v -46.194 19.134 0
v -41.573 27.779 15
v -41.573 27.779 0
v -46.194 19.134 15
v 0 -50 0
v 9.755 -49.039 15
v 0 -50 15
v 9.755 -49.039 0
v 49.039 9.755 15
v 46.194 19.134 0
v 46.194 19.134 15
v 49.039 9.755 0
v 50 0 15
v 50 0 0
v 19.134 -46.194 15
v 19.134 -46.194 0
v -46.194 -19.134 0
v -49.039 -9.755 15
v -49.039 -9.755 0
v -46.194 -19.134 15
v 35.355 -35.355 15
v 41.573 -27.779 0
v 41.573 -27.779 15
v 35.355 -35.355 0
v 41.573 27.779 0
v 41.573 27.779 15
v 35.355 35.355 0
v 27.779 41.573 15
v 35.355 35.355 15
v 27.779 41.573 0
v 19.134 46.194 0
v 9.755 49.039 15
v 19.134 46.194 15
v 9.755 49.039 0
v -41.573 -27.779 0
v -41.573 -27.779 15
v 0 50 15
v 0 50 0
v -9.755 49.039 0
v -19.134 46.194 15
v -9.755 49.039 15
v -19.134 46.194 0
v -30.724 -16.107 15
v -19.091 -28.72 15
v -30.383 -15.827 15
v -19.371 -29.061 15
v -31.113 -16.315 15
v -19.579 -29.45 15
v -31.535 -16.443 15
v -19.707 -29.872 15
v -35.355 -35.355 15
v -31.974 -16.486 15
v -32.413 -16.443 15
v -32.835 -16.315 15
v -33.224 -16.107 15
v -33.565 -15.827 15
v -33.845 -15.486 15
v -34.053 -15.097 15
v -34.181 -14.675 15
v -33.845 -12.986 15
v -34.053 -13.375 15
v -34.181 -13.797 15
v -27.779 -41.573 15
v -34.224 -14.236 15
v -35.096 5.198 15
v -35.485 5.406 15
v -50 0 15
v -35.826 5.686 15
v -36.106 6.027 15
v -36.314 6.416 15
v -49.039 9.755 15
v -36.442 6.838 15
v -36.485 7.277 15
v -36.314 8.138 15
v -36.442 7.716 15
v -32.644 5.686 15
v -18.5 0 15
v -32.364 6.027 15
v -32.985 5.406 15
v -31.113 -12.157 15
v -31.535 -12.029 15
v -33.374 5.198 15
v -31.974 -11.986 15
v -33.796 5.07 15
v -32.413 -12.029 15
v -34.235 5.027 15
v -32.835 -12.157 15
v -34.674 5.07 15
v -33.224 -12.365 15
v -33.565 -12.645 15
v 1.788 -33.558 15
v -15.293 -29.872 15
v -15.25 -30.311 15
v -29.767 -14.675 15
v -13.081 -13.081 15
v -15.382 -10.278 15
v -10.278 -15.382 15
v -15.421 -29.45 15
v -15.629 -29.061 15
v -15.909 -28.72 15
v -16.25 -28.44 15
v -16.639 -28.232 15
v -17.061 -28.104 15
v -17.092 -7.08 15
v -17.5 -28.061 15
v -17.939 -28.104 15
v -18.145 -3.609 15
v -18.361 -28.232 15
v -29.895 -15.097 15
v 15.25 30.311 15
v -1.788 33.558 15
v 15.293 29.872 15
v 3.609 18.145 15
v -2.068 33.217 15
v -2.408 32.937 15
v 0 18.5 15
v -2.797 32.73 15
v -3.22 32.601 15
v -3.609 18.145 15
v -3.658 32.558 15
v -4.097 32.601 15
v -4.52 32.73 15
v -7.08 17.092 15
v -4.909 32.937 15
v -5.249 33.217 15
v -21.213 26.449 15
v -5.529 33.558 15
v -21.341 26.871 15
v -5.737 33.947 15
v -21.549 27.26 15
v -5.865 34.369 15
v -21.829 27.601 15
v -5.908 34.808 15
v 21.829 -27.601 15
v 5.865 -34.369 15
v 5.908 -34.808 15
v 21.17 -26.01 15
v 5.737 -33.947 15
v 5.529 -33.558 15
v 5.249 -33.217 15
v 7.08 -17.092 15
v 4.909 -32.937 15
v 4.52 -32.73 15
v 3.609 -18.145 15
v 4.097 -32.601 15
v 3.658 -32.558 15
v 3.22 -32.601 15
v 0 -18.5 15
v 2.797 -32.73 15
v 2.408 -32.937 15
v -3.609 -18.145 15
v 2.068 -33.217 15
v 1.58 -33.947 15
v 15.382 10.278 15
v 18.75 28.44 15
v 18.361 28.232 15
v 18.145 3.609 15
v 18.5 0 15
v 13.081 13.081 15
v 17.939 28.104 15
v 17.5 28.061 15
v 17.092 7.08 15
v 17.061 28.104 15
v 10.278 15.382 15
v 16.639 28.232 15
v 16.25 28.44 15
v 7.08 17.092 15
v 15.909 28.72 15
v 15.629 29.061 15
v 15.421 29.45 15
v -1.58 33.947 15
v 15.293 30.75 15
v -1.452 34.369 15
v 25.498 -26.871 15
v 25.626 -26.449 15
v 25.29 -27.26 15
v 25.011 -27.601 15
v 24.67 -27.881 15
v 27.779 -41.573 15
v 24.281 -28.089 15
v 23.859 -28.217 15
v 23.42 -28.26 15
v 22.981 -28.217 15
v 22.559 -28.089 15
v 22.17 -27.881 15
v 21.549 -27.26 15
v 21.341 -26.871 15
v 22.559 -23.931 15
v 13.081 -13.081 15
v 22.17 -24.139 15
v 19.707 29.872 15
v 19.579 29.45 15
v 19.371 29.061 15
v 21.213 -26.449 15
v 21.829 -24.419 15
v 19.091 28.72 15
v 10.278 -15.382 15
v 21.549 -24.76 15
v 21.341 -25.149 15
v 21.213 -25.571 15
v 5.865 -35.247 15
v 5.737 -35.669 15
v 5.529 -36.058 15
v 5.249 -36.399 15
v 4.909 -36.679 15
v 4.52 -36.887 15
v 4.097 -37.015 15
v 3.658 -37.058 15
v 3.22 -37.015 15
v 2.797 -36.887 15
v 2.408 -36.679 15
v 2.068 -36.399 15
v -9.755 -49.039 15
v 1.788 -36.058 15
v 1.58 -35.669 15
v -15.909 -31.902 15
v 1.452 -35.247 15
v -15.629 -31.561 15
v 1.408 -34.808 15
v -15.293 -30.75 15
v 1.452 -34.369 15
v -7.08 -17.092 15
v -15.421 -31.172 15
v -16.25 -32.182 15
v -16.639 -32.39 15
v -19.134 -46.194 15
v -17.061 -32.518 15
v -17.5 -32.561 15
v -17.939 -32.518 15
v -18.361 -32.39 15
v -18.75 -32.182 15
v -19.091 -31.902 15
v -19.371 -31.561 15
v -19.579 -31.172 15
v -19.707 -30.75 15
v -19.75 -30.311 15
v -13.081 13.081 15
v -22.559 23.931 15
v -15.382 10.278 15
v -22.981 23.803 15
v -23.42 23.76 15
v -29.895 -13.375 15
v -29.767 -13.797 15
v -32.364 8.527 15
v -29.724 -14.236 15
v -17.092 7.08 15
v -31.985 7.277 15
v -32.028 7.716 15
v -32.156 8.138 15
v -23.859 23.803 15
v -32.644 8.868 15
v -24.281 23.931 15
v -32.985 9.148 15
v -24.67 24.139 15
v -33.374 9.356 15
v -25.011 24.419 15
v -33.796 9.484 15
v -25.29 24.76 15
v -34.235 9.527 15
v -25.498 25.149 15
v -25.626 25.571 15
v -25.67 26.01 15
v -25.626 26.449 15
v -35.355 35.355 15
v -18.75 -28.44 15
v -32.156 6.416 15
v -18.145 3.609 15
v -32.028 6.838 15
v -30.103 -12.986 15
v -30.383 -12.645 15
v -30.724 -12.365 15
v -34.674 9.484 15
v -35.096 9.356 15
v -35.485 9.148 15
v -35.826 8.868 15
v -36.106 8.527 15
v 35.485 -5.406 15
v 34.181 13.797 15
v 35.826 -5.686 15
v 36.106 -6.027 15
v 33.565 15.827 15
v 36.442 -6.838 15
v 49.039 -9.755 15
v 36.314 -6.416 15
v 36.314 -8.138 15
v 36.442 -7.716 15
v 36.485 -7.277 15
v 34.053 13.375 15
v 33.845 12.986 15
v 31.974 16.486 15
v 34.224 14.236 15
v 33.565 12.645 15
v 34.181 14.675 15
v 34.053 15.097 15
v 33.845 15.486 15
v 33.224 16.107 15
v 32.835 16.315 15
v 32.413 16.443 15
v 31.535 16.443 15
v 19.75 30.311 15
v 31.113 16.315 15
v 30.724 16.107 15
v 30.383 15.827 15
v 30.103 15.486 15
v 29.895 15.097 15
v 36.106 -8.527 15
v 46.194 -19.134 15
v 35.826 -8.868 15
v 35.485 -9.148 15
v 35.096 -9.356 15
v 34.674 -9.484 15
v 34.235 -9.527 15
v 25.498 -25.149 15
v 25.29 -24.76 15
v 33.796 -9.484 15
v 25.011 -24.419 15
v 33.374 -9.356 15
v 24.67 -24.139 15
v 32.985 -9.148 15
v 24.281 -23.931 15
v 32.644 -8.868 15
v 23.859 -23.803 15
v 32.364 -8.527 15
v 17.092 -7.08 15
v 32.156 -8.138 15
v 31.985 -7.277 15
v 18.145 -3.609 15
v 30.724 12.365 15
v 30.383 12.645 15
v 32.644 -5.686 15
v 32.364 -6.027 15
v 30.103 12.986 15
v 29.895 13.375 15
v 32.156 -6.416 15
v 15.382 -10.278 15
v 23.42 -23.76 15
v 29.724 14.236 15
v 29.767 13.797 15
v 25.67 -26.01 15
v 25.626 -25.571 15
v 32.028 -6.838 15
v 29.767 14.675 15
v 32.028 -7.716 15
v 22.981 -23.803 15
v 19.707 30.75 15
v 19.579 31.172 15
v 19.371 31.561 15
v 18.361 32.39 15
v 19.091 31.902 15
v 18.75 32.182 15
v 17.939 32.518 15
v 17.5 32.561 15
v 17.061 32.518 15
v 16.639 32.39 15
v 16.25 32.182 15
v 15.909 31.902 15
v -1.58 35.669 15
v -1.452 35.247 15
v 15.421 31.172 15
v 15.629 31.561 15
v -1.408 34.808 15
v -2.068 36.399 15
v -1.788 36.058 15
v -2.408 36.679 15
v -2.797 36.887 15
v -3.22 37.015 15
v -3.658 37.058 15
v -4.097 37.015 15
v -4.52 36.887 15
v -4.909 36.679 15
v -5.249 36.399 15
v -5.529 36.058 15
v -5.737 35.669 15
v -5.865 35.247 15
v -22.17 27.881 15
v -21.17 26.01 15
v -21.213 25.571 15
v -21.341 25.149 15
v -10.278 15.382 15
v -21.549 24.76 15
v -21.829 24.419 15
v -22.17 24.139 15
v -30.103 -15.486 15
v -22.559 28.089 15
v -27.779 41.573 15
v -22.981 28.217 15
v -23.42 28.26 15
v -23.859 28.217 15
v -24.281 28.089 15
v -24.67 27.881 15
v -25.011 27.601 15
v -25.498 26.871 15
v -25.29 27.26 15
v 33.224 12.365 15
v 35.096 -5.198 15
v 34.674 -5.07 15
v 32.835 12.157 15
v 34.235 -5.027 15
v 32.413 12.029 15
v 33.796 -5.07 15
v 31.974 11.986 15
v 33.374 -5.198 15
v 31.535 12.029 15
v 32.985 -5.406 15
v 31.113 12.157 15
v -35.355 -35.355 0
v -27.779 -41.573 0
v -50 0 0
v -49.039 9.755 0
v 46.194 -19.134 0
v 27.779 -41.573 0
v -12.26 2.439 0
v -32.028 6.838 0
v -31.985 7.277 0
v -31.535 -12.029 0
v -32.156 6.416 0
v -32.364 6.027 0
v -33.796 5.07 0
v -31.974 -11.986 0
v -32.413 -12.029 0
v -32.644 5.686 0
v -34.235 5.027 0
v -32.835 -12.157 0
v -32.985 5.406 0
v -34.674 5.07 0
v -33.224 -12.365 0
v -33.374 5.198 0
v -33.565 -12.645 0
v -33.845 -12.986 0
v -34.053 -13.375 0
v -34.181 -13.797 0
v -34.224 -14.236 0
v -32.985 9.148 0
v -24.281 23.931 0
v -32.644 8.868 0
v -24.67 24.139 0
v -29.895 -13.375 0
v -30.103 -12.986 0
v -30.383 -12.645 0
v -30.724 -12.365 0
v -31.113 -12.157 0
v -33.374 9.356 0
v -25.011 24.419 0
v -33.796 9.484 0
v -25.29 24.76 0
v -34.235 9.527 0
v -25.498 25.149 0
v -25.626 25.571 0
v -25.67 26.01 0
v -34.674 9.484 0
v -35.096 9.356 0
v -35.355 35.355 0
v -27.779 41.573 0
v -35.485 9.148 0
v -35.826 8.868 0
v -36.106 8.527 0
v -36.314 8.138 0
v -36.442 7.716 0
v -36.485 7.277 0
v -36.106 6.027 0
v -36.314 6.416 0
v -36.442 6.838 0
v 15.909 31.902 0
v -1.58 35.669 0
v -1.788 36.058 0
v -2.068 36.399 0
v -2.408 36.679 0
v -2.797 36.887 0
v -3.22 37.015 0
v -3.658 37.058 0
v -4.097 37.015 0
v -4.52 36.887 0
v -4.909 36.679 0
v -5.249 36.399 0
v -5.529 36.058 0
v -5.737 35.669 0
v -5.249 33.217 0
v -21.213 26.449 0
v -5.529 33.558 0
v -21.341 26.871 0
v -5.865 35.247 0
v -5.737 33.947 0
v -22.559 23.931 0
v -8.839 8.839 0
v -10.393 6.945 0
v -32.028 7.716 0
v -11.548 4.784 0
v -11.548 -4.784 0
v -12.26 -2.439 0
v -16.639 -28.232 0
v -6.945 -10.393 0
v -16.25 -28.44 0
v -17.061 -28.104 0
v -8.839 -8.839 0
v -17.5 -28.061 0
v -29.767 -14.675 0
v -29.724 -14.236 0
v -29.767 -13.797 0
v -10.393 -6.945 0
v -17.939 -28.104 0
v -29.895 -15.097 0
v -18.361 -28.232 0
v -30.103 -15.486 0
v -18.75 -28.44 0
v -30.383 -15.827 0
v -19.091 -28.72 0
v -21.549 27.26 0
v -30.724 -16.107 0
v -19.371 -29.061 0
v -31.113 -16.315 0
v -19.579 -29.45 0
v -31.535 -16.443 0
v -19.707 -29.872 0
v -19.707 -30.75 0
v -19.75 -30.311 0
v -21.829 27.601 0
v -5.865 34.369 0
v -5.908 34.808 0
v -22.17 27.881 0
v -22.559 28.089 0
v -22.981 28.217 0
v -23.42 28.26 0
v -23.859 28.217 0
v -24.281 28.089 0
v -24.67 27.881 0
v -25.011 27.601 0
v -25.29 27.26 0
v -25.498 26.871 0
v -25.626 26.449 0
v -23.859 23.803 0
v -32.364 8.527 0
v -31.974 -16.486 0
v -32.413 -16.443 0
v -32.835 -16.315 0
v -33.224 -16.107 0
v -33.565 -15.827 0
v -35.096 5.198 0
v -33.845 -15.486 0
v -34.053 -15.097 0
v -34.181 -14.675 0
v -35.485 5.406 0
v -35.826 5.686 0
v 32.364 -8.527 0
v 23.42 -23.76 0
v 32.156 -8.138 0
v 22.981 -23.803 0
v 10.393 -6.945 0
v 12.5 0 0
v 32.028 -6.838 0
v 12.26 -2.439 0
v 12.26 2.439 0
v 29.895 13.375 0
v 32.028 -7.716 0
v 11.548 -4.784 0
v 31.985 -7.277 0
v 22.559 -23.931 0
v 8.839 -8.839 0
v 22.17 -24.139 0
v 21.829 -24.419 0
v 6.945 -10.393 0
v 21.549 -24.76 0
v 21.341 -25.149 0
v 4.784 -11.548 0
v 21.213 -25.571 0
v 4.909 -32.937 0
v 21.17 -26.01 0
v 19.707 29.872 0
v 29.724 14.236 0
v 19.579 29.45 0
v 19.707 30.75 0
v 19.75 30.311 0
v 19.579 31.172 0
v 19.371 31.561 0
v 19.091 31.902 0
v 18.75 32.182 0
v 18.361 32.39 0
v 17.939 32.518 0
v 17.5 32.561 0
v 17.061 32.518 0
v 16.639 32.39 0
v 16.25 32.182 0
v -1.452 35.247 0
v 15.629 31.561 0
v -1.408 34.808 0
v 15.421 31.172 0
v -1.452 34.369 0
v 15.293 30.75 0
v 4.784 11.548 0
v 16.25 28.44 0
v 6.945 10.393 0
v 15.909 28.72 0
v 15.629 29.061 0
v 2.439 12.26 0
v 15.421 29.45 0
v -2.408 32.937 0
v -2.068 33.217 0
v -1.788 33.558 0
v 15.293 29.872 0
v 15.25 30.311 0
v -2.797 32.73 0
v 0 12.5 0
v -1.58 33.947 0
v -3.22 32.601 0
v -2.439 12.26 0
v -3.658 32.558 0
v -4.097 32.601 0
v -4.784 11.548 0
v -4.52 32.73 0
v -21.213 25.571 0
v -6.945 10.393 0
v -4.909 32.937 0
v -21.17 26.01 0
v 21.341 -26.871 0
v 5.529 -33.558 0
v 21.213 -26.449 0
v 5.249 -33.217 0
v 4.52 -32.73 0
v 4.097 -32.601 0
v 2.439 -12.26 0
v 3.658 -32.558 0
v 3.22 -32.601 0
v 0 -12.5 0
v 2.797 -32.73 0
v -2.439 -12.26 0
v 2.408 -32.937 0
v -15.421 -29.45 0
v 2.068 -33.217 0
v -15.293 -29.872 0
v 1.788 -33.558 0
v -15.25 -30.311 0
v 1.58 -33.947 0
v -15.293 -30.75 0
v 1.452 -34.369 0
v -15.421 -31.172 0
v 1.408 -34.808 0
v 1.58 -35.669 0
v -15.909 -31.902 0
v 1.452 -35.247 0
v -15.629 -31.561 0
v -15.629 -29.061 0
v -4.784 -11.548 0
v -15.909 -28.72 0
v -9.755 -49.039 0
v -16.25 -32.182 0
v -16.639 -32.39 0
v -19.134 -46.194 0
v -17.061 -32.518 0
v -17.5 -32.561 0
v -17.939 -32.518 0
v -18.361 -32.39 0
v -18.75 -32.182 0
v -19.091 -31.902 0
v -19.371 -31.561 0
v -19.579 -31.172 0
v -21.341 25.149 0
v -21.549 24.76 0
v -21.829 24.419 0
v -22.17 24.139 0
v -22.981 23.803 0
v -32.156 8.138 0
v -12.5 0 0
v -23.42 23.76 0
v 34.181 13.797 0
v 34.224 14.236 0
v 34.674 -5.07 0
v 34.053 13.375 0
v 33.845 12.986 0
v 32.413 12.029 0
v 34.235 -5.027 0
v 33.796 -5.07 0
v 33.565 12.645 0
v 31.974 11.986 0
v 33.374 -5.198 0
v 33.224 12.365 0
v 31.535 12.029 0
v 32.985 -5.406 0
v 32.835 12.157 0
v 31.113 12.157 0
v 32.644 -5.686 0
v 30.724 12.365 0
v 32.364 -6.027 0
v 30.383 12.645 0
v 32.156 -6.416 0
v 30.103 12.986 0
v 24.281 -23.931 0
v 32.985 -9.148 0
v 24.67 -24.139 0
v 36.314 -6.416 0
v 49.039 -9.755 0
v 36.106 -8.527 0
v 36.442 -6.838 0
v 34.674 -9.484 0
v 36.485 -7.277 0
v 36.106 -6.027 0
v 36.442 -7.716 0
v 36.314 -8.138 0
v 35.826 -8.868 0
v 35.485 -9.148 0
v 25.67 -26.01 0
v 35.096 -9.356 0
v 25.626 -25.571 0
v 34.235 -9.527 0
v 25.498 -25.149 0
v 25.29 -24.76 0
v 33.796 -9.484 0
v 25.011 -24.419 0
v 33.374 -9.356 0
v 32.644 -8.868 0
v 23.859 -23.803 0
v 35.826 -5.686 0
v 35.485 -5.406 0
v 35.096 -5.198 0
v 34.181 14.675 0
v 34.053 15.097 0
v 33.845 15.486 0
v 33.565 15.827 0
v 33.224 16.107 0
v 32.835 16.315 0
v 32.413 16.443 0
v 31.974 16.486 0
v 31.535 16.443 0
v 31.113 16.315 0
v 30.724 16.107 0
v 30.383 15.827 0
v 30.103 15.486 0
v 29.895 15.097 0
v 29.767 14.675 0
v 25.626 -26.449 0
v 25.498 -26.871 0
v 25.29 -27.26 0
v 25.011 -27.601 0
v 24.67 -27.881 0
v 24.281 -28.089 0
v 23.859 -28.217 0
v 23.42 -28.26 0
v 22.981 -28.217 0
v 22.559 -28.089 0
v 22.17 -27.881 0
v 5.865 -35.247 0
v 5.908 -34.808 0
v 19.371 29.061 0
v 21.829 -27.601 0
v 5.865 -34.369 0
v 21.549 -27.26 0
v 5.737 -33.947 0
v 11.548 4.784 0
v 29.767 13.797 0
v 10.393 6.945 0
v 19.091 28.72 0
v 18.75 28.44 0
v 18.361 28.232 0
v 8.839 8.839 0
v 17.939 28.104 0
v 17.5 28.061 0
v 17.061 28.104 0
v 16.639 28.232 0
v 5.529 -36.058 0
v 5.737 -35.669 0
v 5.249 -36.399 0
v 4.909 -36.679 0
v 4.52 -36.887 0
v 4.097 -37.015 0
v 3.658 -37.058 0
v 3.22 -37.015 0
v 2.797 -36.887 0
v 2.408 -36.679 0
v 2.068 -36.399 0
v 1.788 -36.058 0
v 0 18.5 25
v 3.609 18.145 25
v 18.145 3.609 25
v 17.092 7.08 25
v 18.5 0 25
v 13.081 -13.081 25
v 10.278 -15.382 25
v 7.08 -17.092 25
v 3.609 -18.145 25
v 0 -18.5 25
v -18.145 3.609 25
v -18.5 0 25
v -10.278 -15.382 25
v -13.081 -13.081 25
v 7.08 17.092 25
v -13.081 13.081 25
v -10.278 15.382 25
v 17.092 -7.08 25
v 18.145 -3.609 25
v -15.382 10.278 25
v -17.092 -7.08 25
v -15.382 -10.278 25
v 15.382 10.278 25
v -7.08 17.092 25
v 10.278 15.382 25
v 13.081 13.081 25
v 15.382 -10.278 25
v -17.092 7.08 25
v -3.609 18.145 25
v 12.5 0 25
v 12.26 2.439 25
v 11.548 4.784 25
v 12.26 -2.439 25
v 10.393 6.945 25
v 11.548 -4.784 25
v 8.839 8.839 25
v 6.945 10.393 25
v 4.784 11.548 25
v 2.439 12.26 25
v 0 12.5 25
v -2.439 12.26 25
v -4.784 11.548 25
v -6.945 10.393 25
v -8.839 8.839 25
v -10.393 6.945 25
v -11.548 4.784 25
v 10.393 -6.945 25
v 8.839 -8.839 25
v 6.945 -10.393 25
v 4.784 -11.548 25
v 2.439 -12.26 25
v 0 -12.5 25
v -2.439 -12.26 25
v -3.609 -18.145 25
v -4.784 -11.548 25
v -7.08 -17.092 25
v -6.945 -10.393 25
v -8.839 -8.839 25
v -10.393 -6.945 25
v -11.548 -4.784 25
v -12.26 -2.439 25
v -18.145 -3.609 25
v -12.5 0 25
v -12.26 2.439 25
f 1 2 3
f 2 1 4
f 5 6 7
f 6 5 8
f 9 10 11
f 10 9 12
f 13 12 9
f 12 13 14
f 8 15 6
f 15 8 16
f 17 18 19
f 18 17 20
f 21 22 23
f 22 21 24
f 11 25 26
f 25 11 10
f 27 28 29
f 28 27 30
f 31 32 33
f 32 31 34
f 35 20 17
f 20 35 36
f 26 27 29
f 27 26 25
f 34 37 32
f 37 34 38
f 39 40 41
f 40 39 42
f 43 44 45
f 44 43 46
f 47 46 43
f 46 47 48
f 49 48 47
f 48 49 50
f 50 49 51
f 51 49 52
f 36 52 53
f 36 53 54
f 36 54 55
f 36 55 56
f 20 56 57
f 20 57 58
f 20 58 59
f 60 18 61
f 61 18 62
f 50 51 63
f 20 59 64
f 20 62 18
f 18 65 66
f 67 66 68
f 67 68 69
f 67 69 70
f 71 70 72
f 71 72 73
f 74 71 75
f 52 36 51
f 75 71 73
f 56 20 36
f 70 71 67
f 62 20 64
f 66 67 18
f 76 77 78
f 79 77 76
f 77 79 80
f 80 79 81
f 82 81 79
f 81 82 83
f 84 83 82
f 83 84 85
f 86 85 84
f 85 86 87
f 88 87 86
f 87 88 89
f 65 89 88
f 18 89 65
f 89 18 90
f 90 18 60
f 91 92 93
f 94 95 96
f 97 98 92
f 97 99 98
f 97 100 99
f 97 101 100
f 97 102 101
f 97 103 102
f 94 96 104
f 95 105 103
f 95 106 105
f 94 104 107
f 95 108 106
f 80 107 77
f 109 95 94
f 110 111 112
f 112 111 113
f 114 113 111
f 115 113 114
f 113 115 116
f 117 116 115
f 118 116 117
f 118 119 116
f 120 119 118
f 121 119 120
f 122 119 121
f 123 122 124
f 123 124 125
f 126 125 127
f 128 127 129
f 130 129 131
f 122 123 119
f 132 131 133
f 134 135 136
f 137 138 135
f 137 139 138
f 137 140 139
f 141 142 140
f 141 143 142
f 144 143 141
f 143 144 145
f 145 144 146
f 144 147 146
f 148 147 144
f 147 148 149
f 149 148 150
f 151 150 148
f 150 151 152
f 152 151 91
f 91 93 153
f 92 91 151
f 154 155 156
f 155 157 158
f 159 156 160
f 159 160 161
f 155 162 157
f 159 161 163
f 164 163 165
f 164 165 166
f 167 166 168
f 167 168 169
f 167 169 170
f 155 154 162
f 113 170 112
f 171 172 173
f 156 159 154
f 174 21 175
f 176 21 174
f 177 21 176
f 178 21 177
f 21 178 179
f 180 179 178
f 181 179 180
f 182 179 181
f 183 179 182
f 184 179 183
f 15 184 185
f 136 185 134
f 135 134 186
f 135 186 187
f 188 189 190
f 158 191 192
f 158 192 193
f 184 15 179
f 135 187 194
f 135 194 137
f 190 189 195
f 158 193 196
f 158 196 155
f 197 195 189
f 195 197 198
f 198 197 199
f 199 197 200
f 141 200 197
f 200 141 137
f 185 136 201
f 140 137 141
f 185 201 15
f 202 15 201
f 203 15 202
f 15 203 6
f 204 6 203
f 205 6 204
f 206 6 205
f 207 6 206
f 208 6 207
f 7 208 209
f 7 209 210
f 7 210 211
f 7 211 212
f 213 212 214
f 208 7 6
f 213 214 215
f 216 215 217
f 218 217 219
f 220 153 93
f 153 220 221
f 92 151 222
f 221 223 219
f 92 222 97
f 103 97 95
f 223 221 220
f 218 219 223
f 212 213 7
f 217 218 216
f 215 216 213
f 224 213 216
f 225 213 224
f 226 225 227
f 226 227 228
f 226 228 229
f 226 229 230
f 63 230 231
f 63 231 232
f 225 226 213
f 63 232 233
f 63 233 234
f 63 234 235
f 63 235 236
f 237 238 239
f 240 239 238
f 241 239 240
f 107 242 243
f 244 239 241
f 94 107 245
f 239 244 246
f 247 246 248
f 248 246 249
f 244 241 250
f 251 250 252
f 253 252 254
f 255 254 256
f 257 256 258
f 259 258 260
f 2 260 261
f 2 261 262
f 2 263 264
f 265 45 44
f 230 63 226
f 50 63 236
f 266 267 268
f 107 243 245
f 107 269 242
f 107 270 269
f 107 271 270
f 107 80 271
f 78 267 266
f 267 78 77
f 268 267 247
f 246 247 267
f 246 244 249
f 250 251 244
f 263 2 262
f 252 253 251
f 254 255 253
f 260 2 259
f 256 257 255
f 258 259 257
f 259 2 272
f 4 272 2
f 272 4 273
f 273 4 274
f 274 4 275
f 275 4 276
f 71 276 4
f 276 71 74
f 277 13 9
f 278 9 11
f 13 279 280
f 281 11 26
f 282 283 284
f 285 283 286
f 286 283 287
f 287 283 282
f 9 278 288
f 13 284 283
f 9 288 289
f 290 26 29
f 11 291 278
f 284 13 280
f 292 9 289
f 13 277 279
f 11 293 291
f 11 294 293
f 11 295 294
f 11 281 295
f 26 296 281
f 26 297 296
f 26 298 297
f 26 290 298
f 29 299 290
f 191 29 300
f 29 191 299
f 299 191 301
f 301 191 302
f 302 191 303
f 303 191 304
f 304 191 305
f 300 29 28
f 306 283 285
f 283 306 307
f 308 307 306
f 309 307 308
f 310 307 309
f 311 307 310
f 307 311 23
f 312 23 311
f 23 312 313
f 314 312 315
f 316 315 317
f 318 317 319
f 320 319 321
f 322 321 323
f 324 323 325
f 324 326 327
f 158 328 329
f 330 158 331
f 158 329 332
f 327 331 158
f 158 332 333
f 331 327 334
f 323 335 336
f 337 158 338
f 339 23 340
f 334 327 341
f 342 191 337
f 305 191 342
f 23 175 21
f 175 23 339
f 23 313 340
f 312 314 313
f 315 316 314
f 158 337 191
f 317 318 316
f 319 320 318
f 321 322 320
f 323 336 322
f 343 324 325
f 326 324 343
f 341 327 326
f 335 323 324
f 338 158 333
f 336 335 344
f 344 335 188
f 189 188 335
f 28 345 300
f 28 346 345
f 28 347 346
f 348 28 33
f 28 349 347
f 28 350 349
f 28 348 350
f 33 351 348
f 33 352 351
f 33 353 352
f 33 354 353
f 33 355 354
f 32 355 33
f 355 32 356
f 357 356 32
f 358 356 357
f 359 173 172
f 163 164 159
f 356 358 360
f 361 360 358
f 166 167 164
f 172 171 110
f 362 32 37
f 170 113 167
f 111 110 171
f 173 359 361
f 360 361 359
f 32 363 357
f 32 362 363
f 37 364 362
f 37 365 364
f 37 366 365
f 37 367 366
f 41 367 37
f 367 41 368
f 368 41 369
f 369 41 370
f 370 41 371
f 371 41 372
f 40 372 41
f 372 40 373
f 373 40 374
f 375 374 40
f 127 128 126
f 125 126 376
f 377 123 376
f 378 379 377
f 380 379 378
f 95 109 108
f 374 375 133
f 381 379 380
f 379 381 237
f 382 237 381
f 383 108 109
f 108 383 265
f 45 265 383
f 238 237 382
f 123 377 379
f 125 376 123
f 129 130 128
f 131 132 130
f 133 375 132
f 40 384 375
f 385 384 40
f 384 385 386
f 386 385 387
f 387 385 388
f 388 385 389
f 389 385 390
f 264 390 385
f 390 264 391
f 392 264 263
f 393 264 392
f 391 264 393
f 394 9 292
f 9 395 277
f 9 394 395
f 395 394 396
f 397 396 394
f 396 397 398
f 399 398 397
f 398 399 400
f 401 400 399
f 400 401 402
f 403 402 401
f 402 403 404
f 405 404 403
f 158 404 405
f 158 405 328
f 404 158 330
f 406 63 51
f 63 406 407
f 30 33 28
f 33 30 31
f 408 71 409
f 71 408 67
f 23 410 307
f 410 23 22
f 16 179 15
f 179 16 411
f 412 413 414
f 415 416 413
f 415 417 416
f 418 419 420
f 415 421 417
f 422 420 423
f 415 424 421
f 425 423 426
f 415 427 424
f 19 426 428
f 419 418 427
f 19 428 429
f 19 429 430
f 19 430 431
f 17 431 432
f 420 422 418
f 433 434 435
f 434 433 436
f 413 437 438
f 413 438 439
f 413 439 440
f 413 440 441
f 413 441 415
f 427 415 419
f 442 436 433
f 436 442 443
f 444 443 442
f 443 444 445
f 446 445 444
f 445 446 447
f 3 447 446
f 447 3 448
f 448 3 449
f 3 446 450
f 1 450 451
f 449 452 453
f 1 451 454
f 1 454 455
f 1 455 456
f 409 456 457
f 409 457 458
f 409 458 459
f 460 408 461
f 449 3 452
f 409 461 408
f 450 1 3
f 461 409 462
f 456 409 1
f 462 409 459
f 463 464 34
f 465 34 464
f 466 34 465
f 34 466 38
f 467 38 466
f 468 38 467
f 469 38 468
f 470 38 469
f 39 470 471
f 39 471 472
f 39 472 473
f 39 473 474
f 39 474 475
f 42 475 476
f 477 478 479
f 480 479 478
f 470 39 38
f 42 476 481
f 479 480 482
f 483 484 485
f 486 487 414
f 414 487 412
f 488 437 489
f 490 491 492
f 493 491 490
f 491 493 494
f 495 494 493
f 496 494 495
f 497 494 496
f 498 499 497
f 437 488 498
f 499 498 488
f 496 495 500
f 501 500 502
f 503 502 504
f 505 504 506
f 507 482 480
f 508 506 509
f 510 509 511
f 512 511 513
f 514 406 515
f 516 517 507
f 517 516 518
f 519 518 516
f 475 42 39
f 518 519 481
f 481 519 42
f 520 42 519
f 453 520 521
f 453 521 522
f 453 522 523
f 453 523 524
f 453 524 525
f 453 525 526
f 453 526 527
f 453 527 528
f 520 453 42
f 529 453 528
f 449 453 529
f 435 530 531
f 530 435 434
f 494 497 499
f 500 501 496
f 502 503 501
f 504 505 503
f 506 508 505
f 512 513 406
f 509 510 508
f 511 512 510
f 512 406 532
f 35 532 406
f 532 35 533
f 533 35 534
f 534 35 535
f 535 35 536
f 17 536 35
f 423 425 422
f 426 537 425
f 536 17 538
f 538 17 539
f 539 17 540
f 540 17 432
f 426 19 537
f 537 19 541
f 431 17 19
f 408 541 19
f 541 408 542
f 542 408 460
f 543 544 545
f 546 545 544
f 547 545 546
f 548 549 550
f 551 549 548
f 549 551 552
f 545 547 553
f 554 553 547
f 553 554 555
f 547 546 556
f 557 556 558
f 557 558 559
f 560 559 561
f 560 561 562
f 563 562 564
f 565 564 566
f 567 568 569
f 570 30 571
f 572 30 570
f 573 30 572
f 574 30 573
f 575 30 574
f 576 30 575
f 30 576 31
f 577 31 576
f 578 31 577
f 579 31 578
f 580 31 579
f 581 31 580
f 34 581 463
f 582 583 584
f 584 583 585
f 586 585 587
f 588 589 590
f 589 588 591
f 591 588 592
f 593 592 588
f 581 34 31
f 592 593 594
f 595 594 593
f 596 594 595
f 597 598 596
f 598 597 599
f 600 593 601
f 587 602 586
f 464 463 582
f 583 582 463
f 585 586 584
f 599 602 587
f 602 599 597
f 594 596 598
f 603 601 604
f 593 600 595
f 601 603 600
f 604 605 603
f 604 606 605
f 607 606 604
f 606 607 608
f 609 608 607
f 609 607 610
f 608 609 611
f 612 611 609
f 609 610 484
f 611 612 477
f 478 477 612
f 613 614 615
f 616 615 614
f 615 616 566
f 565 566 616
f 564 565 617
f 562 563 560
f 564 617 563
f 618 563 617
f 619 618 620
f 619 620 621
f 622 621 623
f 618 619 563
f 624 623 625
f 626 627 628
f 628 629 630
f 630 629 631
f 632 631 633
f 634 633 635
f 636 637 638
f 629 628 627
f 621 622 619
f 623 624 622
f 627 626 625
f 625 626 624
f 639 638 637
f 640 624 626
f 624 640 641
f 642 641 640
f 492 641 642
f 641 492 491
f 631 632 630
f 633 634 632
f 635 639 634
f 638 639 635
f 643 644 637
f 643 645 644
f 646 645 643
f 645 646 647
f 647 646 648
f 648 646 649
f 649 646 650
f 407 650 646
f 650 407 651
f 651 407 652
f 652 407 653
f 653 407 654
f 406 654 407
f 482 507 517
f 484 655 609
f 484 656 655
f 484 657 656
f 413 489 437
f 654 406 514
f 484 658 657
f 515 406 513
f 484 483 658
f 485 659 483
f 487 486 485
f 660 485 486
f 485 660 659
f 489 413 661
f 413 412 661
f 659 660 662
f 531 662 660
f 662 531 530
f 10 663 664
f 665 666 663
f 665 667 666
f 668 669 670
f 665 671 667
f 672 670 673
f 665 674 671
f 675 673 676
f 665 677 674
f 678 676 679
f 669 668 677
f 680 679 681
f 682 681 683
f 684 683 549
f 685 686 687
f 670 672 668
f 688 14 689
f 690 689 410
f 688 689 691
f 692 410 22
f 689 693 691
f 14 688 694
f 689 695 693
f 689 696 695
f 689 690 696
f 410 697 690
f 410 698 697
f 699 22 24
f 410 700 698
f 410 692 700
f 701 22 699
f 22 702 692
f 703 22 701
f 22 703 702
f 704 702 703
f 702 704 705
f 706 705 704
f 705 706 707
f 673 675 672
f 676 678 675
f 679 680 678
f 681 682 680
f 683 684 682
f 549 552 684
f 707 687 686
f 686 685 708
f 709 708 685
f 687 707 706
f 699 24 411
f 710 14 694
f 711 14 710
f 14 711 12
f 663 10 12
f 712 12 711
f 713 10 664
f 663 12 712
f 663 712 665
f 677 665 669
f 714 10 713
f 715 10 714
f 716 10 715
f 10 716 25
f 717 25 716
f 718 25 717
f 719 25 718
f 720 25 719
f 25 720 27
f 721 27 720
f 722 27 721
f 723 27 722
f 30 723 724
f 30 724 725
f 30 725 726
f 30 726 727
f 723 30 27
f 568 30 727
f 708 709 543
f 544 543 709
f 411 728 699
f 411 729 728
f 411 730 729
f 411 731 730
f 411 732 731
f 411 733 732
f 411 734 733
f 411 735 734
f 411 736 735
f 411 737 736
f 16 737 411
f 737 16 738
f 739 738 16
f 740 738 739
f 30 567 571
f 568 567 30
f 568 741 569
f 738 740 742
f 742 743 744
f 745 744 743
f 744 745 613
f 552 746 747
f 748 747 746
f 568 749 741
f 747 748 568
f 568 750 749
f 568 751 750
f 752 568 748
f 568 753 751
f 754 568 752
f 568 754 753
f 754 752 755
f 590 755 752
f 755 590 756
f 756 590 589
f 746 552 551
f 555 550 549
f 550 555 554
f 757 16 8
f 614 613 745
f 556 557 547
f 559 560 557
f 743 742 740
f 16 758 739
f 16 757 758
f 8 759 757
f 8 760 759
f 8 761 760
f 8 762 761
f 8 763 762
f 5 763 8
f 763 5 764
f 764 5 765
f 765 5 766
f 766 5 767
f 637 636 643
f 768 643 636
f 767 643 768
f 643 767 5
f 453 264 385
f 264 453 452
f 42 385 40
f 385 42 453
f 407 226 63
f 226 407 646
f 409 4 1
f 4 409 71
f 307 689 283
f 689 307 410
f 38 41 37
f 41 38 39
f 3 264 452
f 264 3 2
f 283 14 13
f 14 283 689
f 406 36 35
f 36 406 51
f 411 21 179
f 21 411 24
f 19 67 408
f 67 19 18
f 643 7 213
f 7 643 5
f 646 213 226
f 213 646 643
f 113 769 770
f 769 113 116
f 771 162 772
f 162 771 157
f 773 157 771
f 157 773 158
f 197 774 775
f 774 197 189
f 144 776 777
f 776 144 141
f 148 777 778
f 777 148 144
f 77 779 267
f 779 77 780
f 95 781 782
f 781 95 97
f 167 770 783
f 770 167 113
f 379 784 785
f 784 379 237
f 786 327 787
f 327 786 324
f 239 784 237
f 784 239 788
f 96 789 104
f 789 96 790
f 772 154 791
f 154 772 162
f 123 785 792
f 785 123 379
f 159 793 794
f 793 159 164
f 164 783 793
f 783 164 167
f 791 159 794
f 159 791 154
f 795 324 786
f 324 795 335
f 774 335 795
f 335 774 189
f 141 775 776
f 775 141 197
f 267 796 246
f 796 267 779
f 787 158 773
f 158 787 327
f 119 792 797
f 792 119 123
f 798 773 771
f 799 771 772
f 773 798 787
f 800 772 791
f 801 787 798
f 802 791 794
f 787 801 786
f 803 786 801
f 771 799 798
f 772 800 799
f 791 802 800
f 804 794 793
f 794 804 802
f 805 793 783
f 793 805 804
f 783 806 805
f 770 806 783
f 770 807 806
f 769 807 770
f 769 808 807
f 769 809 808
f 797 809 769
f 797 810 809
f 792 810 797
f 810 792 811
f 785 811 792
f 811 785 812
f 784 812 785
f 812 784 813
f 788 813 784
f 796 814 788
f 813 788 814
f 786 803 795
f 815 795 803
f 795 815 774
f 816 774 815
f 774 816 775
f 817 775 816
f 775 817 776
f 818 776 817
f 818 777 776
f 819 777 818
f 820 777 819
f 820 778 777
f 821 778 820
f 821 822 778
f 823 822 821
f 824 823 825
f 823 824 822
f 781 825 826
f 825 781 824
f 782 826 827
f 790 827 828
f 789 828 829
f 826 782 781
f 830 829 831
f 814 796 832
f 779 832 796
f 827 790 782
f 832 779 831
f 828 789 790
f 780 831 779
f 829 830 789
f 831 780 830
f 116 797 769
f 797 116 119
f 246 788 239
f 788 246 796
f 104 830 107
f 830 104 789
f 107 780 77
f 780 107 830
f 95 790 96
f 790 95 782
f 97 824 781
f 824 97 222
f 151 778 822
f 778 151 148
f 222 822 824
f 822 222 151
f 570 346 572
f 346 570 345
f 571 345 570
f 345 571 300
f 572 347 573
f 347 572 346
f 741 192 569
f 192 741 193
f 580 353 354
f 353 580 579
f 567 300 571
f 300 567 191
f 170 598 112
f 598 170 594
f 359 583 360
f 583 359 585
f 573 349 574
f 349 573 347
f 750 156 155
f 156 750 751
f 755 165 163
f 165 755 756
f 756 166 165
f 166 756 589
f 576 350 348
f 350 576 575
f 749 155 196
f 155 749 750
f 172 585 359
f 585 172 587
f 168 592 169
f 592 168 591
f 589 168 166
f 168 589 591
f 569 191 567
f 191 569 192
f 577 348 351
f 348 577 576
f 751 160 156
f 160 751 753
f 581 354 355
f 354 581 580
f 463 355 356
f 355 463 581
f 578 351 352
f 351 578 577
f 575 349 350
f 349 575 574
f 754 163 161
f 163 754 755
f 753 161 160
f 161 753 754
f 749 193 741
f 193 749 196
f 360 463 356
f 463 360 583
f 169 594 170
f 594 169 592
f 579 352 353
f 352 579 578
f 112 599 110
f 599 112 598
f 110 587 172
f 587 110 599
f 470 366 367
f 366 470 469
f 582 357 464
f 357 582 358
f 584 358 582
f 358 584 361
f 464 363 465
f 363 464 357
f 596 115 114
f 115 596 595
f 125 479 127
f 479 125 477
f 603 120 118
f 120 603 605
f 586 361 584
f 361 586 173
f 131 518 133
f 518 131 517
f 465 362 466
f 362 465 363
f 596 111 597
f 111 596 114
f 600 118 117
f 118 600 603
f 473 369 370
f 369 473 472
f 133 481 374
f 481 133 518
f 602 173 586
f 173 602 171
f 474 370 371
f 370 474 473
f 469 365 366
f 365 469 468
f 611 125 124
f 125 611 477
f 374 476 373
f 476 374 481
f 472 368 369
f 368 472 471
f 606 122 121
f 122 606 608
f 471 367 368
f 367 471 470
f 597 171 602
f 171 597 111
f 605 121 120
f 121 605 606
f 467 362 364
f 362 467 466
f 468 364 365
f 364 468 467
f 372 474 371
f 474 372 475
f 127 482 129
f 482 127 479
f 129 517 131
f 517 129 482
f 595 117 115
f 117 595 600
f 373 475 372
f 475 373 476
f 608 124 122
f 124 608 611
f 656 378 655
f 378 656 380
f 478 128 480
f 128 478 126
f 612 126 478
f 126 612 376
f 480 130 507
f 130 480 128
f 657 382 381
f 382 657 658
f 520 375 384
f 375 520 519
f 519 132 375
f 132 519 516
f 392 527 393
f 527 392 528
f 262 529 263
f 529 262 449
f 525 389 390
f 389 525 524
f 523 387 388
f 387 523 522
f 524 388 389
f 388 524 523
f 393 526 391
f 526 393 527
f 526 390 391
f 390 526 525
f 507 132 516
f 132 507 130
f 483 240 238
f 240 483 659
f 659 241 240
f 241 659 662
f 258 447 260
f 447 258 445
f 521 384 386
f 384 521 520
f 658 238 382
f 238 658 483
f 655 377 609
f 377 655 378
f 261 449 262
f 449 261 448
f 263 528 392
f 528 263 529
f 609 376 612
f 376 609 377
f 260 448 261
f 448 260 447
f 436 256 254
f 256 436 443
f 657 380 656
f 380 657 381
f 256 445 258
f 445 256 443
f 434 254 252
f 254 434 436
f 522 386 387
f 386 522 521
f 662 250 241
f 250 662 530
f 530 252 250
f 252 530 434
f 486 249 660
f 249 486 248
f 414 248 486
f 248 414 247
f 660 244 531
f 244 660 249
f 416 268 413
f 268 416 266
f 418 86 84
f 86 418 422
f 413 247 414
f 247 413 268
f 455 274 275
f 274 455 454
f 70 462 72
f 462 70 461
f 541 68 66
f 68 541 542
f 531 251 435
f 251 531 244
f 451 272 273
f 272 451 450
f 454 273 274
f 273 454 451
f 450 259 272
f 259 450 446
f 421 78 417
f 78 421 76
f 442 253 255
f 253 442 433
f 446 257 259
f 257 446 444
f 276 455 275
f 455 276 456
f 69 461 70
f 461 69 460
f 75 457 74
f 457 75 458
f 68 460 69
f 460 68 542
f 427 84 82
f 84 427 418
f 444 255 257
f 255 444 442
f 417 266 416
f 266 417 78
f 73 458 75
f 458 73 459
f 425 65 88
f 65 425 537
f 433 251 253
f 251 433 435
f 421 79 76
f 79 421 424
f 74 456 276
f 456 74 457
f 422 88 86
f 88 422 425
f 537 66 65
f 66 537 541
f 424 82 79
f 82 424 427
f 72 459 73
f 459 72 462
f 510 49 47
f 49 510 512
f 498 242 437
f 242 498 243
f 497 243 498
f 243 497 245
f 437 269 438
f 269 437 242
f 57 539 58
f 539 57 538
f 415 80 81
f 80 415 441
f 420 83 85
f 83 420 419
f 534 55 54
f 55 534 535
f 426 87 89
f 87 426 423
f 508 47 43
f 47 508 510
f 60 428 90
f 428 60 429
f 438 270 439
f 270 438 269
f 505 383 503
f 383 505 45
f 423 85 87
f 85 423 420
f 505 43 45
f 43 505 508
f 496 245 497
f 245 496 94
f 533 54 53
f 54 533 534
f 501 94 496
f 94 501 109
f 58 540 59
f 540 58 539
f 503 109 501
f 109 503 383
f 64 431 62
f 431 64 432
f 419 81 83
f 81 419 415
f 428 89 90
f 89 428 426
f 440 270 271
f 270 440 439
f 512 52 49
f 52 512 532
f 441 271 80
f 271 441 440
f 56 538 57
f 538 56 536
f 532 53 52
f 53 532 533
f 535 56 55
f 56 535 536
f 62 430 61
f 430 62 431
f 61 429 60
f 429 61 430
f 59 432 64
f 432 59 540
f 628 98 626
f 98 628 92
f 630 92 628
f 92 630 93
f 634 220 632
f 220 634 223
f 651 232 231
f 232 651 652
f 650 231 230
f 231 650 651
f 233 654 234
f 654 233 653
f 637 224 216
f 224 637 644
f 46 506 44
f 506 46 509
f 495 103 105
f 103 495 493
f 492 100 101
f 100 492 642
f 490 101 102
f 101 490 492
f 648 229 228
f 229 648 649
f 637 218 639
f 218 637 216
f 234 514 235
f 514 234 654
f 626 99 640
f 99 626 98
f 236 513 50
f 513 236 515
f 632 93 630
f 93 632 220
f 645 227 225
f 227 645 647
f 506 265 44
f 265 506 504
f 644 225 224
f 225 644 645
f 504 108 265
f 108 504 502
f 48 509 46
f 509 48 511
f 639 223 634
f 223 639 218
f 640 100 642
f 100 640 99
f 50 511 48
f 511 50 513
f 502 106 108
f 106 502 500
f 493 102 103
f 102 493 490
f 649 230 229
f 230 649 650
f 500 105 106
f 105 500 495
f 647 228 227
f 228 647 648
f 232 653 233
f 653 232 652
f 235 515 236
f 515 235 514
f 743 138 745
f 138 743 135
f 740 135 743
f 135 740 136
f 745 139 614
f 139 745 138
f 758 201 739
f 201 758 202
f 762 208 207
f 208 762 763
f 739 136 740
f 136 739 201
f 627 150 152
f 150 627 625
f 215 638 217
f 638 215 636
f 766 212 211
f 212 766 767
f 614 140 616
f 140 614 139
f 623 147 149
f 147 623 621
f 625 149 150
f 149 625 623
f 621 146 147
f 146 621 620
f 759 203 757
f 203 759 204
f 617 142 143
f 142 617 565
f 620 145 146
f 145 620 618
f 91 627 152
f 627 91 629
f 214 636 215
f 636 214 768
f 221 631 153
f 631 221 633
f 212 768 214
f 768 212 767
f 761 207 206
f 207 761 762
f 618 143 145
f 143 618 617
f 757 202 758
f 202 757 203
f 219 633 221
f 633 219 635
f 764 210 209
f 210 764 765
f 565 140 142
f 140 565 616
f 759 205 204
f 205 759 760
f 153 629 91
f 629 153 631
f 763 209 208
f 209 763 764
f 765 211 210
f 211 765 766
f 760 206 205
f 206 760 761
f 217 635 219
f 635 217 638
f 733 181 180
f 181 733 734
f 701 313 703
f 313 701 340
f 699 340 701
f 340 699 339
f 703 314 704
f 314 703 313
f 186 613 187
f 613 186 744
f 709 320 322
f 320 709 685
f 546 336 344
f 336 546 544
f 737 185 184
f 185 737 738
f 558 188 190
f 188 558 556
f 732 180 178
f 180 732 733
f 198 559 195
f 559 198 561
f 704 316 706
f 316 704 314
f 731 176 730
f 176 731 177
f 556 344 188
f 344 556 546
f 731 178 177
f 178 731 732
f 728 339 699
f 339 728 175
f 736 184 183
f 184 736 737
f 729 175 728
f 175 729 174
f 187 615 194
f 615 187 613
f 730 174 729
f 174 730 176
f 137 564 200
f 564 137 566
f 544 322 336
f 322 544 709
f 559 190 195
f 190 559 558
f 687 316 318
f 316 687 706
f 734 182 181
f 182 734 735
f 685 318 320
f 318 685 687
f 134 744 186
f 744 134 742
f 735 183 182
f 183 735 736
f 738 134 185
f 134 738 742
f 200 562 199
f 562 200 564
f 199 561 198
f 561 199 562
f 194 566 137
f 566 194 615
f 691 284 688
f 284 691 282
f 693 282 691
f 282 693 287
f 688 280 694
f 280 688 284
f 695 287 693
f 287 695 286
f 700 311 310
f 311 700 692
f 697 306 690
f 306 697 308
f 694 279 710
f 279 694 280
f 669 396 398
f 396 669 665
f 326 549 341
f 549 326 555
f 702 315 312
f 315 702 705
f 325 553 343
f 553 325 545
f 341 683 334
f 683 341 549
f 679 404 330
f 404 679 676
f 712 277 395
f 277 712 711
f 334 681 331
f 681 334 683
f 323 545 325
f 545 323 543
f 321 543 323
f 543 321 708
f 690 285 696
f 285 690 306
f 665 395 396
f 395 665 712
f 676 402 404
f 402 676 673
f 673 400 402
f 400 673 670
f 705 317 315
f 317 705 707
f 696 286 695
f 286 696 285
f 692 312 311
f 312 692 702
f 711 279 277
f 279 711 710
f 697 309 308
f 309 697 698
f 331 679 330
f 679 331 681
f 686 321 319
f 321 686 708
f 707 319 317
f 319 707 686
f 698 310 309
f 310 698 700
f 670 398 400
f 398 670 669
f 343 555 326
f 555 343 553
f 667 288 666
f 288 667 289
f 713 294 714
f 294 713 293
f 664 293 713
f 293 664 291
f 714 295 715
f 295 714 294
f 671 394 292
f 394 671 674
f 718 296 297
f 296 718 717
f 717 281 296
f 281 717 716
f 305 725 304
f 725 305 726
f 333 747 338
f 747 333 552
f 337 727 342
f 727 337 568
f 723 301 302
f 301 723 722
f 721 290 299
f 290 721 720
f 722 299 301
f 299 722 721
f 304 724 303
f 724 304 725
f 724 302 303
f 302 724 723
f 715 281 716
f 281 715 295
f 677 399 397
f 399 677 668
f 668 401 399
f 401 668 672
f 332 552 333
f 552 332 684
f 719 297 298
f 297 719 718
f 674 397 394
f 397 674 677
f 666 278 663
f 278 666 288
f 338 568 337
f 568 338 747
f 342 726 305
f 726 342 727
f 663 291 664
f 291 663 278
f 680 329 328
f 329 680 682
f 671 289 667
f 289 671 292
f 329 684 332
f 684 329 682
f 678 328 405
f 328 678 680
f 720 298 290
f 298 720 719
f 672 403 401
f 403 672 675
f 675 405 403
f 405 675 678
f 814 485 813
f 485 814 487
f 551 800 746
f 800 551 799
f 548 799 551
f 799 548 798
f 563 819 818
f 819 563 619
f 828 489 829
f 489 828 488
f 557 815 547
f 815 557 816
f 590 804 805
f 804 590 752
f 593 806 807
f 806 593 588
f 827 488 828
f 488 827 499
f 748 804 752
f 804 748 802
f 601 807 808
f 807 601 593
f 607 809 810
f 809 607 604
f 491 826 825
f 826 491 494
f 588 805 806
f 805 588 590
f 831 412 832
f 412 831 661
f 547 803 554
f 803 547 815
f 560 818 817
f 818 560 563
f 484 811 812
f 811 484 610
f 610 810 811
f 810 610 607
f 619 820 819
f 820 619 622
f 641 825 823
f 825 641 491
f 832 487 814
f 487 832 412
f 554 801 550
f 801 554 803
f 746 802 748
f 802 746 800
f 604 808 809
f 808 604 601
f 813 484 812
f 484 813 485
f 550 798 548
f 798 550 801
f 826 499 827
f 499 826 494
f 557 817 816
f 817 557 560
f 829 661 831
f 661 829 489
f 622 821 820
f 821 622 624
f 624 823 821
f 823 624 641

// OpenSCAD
$fn = 32;

// ----------------------------------------------------------------------
// Flange Ø100 x 15
// 10 holes on a Ø70 bolt circle, bolted joints
// ----------------------------------------------------------------------

// --- parameters (mm) ---
flange_d = 100;  // outside diameter of the flange
thickness = 15;  // flange thickness
holes = 10;      // number of bolt holes
pcd = 70;        // bolt circle diameter
start_deg = 60;  // angle of the first hole, from +X
hole_d = 4.5;    // bolt hole diameter
bore_d = 25;     // central through bore
hub_d = 37;      // hub outside diameter
hub_h = 10;      // hub height above the flange face (0 = no hub)

// --- derived feature positions (mm) ---
height = thickness + hub_h;  // = 25   overall height of the part
pcd_r = pcd / 2;             // = 35   bolt circle radius
hole_step = 360 / holes;     // = 36   angular pitch
feature_centers = [
  [pcd_r * cos(start_deg + 0 * hole_step), pcd_r * sin(start_deg + 0 * hole_step)],
  [pcd_r * cos(start_deg + 1 * hole_step), pcd_r * sin(start_deg + 1 * hole_step)],
  [pcd_r * cos(start_deg + 2 * hole_step), pcd_r * sin(start_deg + 2 * hole_step)],
  [pcd_r * cos(start_deg + 3 * hole_step), pcd_r * sin(start_deg + 3 * hole_step)],
  [pcd_r * cos(start_deg + 4 * hole_step), pcd_r * sin(start_deg + 4 * hole_step)],
  [pcd_r * cos(start_deg + 5 * hole_step), pcd_r * sin(start_deg + 5 * hole_step)],
  [pcd_r * cos(start_deg + 6 * hole_step), pcd_r * sin(start_deg + 6 * hole_step)],
  [pcd_r * cos(start_deg + 7 * hole_step), pcd_r * sin(start_deg + 7 * hole_step)],
  [pcd_r * cos(start_deg + 8 * hole_step), pcd_r * sin(start_deg + 8 * hole_step)],
  [pcd_r * cos(start_deg + 9 * hole_step), pcd_r * sin(start_deg + 9 * hole_step)]
];   // bolt hole centres on the pitch circle

// flange disc, every hole and the bore cut straight through
difference() {
  union() {
    cylinder(d = flange_d, h = thickness);
    cylinder(d = hub_d, h = height);  // hub, overlapped into the flange
  }
  translate([0, 0, -1]) cylinder(d = bore_d, h = height + 2);  // bore, through
  for (centre = feature_centers)
    translate([centre[0], centre[1], -1]) cylinder(d = hole_d, h = thickness + 2);
}
